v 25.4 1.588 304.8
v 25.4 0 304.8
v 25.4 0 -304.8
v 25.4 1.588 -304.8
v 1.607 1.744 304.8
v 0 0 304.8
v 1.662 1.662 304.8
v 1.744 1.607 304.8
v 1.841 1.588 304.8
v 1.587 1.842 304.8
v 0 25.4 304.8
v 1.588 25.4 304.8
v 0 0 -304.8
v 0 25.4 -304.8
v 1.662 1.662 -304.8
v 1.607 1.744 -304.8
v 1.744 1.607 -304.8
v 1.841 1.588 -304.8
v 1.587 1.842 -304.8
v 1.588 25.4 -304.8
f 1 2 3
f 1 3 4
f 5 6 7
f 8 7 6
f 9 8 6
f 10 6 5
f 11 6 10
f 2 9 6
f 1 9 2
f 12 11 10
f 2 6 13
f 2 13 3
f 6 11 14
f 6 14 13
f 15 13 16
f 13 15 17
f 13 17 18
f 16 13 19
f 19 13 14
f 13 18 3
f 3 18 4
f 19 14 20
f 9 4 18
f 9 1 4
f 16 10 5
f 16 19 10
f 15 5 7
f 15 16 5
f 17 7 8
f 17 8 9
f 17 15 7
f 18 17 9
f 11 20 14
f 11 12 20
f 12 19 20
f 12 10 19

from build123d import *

# Parameters (mm, degrees)
BOSS_EXTRUDE1_DEPTH = 304.8
FILLET1_R           = 0.254


with BuildPart() as part:
    # Sketch3 → Boss-Extrude1 (new, symmetric)
    with BuildSketch(Plane.XY):
        Polygon((1.5875, 25.4), (0, 25.4), (0, 0), (25.4, 0), (25.4, 1.5875), (1.5875, 1.5875), align=None)
    extrude(amount=BOSS_EXTRUDE1_DEPTH, both=True)

    # Fillet1
    fillet1_edges = [part.edges().sort_by_distance(p)[0] for p in [
        (1.5875, 1.5875, 0),
    ]]
    fillet(fillet1_edges, radius=FILLET1_R)


solid = part.part
